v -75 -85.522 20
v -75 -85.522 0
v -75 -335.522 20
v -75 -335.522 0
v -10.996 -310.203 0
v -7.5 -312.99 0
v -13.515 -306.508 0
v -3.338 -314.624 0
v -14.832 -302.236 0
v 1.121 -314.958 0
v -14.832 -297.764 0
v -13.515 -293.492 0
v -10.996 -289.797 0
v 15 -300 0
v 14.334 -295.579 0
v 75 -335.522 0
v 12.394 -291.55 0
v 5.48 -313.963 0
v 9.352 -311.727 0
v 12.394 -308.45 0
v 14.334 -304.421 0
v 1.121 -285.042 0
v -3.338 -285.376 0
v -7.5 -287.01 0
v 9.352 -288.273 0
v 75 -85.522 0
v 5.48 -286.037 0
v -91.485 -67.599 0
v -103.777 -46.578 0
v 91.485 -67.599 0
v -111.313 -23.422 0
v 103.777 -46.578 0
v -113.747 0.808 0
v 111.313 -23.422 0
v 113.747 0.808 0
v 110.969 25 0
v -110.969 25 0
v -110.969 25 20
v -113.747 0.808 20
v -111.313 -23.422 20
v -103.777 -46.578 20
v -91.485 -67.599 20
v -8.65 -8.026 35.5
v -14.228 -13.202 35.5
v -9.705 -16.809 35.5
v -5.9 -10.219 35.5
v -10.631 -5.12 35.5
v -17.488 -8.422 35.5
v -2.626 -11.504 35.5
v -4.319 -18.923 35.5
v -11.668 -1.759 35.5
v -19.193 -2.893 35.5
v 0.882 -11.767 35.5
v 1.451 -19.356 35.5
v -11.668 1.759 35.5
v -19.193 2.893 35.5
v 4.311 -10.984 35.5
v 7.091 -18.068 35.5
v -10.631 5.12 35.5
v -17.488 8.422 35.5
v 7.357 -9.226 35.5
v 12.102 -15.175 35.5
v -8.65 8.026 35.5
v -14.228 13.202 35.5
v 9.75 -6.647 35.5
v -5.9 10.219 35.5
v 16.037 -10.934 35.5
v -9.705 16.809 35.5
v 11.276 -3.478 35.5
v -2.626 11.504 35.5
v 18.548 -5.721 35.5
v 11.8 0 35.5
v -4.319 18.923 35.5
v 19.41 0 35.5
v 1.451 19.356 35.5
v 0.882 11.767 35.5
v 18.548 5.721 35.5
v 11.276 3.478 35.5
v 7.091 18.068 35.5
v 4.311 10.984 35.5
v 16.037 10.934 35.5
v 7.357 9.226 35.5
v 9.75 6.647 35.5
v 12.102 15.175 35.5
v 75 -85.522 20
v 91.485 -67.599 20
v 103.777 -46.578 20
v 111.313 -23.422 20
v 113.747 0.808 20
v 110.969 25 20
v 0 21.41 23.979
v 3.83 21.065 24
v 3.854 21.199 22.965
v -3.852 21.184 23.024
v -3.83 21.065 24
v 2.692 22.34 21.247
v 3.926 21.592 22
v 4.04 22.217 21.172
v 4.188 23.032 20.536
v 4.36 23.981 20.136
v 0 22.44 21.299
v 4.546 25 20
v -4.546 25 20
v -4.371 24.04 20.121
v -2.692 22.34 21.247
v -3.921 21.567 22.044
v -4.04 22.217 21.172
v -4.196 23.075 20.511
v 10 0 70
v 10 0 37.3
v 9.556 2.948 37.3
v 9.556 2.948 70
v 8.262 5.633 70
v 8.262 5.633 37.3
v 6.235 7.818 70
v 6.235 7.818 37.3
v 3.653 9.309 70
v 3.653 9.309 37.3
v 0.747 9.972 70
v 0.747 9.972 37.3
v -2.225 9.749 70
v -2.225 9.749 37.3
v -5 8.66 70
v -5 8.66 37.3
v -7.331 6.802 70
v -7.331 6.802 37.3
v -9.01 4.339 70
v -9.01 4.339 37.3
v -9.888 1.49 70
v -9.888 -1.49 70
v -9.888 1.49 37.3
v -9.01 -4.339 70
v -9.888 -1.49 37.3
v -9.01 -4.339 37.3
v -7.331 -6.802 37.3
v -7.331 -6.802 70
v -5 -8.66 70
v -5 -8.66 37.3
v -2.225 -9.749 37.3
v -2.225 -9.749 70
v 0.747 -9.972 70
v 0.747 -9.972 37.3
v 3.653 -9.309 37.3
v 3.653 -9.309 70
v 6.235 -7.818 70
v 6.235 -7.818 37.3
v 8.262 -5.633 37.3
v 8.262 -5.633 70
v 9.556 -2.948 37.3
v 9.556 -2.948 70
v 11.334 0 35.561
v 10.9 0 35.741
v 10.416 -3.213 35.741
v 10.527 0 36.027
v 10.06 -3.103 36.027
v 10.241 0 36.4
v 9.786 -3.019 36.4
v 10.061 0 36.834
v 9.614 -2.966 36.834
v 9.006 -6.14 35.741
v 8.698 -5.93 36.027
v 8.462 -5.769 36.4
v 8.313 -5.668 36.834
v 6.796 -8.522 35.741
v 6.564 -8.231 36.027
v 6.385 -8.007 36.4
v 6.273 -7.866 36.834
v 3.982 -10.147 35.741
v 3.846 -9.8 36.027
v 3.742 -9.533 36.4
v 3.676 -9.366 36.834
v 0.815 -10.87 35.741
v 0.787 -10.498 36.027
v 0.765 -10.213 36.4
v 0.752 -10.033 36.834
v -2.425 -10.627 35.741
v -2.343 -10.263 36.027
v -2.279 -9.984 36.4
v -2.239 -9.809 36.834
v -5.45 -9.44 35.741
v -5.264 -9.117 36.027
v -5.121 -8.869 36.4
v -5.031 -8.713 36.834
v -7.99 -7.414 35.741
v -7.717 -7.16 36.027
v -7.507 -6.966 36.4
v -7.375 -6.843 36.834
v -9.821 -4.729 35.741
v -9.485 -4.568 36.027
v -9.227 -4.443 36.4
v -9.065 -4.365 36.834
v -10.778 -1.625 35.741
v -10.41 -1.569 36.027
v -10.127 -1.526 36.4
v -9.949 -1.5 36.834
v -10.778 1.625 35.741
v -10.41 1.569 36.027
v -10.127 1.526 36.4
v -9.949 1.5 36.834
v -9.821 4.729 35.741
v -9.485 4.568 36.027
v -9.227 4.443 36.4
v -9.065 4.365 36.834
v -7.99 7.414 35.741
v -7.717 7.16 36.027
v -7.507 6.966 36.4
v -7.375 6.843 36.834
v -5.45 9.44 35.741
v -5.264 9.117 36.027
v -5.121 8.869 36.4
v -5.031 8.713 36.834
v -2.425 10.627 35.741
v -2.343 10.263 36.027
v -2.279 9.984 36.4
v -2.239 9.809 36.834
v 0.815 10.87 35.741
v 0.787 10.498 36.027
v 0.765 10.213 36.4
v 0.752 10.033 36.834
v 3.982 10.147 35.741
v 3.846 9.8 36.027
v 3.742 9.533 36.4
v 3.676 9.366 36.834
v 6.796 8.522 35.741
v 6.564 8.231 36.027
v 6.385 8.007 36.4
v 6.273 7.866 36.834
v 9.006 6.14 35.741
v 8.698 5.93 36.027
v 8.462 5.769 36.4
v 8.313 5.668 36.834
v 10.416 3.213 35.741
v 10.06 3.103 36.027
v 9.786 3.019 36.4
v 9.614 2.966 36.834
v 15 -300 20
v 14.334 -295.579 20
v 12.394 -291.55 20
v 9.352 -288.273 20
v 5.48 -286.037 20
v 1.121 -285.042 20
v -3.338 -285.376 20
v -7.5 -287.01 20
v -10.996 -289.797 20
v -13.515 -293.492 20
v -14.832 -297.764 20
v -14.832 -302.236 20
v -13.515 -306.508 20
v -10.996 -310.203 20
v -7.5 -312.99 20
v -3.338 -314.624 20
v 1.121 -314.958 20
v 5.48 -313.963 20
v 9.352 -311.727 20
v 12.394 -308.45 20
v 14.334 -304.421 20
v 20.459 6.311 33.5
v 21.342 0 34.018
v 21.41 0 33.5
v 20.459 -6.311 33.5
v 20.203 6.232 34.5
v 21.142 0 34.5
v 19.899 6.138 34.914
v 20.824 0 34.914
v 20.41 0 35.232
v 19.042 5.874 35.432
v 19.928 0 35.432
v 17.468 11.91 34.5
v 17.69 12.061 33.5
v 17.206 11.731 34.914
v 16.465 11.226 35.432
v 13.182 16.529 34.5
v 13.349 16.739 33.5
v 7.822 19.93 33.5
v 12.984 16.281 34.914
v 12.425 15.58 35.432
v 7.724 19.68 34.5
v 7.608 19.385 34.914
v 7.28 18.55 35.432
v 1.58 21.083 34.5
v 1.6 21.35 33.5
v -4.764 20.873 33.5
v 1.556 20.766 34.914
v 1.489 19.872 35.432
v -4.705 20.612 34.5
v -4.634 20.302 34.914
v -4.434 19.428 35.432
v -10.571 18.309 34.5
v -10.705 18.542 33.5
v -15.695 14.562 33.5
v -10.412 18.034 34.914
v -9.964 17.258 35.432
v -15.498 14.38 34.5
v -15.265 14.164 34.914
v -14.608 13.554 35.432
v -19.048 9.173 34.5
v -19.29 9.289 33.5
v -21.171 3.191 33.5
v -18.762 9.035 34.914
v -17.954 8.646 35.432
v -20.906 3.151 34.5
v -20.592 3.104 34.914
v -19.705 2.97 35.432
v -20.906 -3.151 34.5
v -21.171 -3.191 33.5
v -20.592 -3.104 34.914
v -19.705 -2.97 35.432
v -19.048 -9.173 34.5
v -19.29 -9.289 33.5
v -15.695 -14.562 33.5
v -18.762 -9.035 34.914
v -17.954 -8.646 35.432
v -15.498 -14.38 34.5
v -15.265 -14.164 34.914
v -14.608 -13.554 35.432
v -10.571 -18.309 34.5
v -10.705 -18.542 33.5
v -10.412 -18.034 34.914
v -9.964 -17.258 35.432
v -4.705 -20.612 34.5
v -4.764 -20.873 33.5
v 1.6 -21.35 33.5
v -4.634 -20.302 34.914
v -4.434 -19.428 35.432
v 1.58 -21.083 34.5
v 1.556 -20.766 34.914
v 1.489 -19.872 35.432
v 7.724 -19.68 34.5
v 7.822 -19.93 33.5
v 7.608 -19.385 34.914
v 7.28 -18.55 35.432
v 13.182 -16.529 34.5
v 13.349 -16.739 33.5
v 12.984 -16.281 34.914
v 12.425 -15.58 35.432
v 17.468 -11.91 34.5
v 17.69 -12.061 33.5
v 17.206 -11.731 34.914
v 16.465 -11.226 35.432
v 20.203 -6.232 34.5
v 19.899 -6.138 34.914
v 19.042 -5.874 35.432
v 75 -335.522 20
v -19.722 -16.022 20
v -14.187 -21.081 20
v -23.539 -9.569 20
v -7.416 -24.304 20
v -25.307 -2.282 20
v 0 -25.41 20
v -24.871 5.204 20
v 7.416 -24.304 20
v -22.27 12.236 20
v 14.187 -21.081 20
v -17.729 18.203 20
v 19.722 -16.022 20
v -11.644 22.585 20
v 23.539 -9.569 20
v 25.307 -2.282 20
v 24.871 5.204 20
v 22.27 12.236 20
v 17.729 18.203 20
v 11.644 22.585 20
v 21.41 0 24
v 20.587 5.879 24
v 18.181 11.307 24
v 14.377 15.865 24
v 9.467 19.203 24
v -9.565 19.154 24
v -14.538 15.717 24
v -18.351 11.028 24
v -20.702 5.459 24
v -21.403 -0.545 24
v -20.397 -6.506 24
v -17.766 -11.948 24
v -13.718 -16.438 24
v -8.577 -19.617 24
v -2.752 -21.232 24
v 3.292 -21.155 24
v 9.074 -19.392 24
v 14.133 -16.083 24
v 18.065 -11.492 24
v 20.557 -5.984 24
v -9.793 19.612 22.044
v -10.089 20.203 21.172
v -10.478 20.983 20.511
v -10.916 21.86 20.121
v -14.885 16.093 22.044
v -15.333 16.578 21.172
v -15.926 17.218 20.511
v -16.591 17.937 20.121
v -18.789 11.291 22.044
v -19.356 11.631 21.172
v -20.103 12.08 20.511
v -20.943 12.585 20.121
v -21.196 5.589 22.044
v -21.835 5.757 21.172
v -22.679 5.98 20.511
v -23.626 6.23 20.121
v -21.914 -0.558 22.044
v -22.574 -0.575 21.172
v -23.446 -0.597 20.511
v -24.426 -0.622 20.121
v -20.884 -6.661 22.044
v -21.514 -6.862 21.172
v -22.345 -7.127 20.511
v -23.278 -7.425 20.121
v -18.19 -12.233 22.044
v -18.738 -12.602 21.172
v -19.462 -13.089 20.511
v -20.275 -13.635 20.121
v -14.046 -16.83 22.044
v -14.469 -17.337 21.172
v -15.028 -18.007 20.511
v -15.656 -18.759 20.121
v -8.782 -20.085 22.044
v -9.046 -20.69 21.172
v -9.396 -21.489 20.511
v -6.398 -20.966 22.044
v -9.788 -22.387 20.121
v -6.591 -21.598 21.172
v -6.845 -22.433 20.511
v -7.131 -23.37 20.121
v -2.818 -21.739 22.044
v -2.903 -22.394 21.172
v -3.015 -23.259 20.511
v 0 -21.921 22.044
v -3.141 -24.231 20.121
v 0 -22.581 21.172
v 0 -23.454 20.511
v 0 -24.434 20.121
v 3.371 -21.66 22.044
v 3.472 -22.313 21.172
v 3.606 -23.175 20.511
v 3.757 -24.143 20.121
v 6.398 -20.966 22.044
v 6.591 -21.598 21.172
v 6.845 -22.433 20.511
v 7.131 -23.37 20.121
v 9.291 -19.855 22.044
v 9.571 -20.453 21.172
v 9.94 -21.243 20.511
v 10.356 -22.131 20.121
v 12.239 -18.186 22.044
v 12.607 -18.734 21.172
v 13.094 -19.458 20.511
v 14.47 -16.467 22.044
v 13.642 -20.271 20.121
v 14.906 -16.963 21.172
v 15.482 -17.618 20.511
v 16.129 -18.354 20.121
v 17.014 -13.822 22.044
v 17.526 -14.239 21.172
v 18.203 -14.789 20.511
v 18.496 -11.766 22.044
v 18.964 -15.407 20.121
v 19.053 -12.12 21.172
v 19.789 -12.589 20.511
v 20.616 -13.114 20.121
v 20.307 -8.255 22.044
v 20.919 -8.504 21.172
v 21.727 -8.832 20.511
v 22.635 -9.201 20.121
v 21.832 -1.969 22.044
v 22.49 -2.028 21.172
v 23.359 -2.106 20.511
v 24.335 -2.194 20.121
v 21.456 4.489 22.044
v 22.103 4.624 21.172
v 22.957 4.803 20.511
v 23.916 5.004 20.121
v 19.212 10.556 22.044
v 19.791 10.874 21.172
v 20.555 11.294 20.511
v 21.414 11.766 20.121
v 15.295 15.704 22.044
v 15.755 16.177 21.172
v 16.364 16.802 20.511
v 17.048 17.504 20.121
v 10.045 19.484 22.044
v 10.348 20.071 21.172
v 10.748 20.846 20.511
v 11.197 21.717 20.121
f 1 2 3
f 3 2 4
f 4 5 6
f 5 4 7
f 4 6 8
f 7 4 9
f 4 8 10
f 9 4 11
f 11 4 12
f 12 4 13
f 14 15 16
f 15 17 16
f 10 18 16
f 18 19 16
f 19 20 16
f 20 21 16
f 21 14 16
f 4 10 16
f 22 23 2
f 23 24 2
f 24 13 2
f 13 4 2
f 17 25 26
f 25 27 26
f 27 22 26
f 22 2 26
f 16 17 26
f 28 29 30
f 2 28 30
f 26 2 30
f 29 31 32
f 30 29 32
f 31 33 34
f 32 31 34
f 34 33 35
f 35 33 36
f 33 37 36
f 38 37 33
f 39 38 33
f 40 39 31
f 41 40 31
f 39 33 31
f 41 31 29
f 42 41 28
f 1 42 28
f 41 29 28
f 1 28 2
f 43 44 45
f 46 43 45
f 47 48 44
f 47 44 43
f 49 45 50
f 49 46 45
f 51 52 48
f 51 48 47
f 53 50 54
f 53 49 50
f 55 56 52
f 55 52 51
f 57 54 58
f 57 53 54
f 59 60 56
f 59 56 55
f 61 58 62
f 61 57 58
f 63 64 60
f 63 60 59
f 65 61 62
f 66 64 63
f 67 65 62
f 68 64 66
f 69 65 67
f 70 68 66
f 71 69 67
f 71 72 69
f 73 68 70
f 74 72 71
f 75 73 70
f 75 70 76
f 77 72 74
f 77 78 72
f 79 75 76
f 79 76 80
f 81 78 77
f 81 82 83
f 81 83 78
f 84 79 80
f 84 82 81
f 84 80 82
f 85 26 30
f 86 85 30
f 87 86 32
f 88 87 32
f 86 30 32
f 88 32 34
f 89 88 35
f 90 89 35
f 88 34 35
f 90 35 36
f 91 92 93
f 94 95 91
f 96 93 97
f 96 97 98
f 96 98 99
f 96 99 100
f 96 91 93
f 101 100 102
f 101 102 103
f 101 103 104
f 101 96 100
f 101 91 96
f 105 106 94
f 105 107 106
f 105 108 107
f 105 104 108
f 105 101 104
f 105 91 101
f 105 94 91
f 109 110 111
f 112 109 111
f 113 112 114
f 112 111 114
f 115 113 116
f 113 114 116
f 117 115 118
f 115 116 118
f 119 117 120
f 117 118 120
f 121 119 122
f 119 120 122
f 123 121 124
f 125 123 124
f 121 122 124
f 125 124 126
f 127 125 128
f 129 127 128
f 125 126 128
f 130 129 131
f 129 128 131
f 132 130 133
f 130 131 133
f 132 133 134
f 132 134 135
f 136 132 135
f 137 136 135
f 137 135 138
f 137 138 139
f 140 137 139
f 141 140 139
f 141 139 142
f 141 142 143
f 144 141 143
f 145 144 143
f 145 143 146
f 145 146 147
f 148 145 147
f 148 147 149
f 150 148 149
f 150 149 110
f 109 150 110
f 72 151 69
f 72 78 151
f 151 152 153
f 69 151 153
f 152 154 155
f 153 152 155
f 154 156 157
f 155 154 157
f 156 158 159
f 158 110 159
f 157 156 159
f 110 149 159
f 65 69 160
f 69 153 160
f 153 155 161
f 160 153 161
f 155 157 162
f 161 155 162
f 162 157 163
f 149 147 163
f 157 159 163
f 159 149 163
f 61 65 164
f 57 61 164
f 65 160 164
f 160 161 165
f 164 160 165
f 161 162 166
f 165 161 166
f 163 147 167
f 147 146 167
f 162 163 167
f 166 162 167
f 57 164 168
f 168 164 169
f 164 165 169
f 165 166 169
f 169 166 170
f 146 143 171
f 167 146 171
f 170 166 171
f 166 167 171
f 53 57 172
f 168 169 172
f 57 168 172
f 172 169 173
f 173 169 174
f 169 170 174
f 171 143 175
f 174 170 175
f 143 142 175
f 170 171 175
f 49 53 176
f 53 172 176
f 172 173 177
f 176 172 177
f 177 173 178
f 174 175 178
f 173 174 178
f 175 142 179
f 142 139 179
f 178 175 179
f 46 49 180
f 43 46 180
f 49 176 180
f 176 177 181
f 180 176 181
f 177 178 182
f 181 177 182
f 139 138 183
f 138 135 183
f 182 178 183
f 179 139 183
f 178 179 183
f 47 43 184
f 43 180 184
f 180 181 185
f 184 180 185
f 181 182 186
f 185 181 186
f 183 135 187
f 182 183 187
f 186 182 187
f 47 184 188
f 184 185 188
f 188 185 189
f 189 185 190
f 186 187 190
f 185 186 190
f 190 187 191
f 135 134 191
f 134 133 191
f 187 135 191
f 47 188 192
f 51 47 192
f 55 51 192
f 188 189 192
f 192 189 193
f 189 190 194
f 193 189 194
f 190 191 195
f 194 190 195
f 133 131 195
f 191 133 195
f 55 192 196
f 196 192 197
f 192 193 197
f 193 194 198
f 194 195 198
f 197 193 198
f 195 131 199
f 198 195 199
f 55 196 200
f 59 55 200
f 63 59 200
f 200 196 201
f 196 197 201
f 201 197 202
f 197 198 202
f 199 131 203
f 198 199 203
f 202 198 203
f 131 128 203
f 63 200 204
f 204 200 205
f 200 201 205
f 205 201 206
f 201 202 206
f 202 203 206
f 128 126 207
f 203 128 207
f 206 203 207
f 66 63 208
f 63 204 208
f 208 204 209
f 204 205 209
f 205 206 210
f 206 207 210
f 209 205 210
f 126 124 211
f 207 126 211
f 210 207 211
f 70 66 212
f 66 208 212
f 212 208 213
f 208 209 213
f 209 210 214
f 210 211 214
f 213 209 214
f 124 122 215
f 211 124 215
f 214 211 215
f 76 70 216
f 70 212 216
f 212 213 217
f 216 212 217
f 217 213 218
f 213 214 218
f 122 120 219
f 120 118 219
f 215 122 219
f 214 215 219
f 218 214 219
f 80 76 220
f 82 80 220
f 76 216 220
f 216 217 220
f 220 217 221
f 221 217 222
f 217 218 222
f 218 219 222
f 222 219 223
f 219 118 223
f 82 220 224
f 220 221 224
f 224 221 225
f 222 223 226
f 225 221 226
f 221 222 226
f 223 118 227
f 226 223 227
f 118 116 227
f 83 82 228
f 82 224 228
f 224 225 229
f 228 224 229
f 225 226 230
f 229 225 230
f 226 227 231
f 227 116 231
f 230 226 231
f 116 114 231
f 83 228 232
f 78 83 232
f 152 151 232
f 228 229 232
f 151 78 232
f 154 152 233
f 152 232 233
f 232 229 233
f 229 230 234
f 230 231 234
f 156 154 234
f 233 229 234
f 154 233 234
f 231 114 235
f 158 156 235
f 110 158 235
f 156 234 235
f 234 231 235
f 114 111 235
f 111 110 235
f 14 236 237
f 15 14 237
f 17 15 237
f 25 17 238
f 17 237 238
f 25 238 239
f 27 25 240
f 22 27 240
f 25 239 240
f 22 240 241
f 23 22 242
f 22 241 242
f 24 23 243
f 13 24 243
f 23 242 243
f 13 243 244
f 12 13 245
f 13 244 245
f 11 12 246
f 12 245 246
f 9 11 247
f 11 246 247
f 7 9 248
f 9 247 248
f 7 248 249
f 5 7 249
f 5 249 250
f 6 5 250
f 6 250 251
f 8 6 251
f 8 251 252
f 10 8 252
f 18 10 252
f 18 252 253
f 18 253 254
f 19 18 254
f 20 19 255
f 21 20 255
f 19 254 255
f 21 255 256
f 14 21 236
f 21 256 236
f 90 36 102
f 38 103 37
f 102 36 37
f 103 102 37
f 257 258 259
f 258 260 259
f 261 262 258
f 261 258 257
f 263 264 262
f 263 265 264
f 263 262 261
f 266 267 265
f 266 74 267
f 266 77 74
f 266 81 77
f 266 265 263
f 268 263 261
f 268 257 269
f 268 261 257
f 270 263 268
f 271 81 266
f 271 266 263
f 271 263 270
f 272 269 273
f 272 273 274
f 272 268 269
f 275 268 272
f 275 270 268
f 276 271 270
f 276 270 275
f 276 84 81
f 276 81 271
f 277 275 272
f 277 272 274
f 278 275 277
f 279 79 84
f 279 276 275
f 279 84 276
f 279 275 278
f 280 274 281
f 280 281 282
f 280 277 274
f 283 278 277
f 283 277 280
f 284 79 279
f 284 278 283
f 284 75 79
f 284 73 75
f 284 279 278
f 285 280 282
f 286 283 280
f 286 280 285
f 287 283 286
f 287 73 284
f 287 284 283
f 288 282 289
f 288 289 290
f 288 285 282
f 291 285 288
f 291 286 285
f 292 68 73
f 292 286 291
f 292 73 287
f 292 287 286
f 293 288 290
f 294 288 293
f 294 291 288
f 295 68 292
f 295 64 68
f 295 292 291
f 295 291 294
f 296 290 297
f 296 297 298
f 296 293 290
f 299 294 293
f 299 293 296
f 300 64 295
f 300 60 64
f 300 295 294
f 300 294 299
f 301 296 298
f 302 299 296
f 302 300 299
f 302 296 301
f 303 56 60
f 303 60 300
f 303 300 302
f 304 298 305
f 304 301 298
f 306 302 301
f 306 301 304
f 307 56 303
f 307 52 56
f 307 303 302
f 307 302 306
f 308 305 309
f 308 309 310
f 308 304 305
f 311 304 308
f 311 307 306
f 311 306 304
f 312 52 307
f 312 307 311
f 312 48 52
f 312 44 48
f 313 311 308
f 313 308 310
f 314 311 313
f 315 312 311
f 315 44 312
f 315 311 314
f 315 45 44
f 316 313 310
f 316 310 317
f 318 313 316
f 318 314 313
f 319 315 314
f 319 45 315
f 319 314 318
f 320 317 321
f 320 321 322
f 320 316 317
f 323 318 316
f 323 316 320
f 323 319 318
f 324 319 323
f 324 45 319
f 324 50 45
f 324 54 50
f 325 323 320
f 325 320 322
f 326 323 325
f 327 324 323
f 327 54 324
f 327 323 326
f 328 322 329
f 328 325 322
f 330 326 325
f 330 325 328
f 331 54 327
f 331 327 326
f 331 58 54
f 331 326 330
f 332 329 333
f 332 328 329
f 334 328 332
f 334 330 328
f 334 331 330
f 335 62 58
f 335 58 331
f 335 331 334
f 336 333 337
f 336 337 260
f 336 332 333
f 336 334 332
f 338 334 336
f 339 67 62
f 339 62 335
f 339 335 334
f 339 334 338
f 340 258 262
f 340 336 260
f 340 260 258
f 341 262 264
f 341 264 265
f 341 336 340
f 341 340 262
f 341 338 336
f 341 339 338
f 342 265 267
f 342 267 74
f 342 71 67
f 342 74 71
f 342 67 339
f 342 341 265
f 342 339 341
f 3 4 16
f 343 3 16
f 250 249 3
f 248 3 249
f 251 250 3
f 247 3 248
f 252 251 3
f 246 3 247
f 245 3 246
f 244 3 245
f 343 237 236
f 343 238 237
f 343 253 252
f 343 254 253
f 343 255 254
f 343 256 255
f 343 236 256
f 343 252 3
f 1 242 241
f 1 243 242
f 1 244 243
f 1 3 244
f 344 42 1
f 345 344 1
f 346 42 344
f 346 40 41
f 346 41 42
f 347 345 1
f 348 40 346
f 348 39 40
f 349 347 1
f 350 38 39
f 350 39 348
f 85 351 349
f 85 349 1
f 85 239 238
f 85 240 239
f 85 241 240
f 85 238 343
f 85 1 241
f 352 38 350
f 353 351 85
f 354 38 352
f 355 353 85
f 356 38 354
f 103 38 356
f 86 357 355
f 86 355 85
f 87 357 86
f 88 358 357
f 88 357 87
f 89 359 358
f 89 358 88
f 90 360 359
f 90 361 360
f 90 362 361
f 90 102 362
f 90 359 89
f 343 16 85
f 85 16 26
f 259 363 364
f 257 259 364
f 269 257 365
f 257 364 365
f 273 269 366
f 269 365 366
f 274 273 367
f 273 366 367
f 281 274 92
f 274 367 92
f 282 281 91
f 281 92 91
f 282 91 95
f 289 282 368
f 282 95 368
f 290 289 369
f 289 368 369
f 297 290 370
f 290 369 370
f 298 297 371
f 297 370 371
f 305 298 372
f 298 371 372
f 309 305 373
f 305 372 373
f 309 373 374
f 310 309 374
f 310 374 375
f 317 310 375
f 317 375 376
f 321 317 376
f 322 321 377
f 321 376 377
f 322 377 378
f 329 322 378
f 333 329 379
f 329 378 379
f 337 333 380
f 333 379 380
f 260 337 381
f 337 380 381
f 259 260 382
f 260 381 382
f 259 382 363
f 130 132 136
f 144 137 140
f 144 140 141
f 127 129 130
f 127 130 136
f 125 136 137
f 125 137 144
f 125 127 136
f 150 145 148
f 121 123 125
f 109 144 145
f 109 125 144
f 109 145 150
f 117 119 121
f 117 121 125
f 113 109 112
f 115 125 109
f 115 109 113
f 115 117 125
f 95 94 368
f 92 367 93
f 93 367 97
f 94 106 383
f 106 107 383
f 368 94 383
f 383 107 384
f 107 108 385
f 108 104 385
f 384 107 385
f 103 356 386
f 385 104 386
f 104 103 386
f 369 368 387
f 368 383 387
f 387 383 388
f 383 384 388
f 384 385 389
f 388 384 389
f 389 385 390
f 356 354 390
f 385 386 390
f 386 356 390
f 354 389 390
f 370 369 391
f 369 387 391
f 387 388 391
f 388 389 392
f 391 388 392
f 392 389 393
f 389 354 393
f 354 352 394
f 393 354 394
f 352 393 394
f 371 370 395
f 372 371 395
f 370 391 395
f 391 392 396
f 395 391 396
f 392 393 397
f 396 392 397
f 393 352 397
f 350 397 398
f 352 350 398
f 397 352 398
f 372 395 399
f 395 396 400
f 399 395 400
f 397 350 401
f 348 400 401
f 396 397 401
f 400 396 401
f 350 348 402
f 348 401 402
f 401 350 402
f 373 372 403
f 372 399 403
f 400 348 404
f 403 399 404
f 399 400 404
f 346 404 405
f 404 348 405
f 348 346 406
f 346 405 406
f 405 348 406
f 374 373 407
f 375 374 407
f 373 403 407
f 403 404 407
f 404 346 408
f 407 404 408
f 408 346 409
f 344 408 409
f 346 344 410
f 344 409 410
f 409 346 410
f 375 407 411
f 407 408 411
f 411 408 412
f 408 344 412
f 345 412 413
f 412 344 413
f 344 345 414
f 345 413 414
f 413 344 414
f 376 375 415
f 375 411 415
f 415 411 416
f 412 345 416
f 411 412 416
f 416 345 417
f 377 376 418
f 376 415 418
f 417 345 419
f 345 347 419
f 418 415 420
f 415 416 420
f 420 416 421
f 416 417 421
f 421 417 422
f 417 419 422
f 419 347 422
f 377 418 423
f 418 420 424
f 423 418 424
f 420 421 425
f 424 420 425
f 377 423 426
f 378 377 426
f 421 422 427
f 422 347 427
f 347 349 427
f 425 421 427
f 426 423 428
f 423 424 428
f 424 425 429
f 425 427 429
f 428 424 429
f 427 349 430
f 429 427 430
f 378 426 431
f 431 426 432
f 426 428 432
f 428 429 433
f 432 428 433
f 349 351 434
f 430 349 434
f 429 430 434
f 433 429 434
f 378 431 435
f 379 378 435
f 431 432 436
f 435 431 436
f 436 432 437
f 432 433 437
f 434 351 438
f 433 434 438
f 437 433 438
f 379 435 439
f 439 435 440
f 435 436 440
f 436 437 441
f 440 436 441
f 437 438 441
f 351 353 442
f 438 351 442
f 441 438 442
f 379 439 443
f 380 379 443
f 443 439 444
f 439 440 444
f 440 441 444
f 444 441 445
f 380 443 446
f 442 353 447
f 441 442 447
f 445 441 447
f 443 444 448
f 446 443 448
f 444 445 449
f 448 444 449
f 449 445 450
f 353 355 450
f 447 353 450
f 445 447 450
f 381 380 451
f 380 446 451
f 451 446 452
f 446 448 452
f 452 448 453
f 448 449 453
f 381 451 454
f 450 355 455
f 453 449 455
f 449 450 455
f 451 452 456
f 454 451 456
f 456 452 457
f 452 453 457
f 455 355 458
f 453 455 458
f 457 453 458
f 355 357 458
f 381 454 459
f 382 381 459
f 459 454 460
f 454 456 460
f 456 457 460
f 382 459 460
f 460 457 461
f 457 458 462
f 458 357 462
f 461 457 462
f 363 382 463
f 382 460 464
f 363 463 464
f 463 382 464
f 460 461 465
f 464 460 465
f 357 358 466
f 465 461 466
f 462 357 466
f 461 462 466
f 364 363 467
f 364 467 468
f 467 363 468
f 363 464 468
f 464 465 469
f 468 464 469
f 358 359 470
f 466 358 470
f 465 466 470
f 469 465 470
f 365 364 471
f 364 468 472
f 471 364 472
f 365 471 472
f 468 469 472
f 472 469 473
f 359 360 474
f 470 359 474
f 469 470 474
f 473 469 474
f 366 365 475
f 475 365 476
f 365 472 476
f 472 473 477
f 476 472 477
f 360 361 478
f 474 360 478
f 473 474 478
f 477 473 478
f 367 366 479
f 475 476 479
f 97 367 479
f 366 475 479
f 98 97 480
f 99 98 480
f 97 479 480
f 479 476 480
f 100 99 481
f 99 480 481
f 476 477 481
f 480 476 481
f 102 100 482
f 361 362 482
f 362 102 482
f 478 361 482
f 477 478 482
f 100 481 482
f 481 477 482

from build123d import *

# Parameters (mm, degrees)
BOSS_EXTRUDE1_DEPTH = 20
BOSS_EXTRUDE2_START = 20
SKETCH1_3_R         = 10
BOSS_EXTRUDE2_DEPTH = 50
SKETCH2_R           = 15
CUT_EXTRUDE1_DEPTH  = 20
SKETCH3_R           = 21.409884381
BOSS_EXTRUDE3_DEPTH = 15.5
FILLET1_R           = 1.8
FILLET2_R           = 4
FILLET3_R           = 2


with BuildPart() as part:
    # Sketch1 → Boss-Extrude1 (new body)
    with BuildSketch(Plane.XY):
        with BuildLine():
            Line((-75, -335.522292415), (75, -335.522292415))
            Line((75, -335.522292415), (75, -85.522292415))
            ThreePointArc((75, -85.522292415), (108.166019919, -35.201912374), (110.9687456, 25))
            Line((110.9687456, 25), (-110.9687456, 25))
            ThreePointArc((-110.9687456, 25), (-108.166019919, -35.201912374), (-75, -85.522292415))
            Line((-75, -85.522292415), (-75, -335.522292415))
        make_face()
    extrude(amount=BOSS_EXTRUDE1_DEPTH)

    # Sketch1<3> → Boss-Extrude2 (add)
    with BuildSketch(Plane.XY.offset(BOSS_EXTRUDE2_START)):
        Circle(SKETCH1_3_R)
    extrude(amount=BOSS_EXTRUDE2_DEPTH)

    # Sketch2 → Cut-Extrude1 (cut)
    with BuildSketch(Plane.XY.offset(20)):
        with Locations((0, -300)):
            Circle(SKETCH2_R)
    extrude(amount=-CUT_EXTRUDE1_DEPTH, mode=Mode.SUBTRACT)

    # Sketch3 → Boss-Extrude3 (add)
    with BuildSketch(Plane.XY.offset(20)):
        Circle(SKETCH3_R)
    extrude(amount=BOSS_EXTRUDE3_DEPTH)

    # Fillet1
    fillet1_edges = [part.edges().sort_by_distance(p)[0] for p in [
        (-10, 0, 35.5),
    ]]
    fillet(fillet1_edges, radius=FILLET1_R)

    # Fillet2
    fillet2_edges = [part.edges().sort_by_distance(p)[0] for p in [
        (-21.409884381, 0, 20),
    ]]
    fillet(fillet2_edges, radius=FILLET2_R)

    # Fillet3
    fillet3_edges = [part.edges().sort_by_distance(p)[0] for p in [
        (-21.409884381, 0, 35.5),
    ]]
    fillet(fillet3_edges, radius=FILLET3_R)


solid = part.part
